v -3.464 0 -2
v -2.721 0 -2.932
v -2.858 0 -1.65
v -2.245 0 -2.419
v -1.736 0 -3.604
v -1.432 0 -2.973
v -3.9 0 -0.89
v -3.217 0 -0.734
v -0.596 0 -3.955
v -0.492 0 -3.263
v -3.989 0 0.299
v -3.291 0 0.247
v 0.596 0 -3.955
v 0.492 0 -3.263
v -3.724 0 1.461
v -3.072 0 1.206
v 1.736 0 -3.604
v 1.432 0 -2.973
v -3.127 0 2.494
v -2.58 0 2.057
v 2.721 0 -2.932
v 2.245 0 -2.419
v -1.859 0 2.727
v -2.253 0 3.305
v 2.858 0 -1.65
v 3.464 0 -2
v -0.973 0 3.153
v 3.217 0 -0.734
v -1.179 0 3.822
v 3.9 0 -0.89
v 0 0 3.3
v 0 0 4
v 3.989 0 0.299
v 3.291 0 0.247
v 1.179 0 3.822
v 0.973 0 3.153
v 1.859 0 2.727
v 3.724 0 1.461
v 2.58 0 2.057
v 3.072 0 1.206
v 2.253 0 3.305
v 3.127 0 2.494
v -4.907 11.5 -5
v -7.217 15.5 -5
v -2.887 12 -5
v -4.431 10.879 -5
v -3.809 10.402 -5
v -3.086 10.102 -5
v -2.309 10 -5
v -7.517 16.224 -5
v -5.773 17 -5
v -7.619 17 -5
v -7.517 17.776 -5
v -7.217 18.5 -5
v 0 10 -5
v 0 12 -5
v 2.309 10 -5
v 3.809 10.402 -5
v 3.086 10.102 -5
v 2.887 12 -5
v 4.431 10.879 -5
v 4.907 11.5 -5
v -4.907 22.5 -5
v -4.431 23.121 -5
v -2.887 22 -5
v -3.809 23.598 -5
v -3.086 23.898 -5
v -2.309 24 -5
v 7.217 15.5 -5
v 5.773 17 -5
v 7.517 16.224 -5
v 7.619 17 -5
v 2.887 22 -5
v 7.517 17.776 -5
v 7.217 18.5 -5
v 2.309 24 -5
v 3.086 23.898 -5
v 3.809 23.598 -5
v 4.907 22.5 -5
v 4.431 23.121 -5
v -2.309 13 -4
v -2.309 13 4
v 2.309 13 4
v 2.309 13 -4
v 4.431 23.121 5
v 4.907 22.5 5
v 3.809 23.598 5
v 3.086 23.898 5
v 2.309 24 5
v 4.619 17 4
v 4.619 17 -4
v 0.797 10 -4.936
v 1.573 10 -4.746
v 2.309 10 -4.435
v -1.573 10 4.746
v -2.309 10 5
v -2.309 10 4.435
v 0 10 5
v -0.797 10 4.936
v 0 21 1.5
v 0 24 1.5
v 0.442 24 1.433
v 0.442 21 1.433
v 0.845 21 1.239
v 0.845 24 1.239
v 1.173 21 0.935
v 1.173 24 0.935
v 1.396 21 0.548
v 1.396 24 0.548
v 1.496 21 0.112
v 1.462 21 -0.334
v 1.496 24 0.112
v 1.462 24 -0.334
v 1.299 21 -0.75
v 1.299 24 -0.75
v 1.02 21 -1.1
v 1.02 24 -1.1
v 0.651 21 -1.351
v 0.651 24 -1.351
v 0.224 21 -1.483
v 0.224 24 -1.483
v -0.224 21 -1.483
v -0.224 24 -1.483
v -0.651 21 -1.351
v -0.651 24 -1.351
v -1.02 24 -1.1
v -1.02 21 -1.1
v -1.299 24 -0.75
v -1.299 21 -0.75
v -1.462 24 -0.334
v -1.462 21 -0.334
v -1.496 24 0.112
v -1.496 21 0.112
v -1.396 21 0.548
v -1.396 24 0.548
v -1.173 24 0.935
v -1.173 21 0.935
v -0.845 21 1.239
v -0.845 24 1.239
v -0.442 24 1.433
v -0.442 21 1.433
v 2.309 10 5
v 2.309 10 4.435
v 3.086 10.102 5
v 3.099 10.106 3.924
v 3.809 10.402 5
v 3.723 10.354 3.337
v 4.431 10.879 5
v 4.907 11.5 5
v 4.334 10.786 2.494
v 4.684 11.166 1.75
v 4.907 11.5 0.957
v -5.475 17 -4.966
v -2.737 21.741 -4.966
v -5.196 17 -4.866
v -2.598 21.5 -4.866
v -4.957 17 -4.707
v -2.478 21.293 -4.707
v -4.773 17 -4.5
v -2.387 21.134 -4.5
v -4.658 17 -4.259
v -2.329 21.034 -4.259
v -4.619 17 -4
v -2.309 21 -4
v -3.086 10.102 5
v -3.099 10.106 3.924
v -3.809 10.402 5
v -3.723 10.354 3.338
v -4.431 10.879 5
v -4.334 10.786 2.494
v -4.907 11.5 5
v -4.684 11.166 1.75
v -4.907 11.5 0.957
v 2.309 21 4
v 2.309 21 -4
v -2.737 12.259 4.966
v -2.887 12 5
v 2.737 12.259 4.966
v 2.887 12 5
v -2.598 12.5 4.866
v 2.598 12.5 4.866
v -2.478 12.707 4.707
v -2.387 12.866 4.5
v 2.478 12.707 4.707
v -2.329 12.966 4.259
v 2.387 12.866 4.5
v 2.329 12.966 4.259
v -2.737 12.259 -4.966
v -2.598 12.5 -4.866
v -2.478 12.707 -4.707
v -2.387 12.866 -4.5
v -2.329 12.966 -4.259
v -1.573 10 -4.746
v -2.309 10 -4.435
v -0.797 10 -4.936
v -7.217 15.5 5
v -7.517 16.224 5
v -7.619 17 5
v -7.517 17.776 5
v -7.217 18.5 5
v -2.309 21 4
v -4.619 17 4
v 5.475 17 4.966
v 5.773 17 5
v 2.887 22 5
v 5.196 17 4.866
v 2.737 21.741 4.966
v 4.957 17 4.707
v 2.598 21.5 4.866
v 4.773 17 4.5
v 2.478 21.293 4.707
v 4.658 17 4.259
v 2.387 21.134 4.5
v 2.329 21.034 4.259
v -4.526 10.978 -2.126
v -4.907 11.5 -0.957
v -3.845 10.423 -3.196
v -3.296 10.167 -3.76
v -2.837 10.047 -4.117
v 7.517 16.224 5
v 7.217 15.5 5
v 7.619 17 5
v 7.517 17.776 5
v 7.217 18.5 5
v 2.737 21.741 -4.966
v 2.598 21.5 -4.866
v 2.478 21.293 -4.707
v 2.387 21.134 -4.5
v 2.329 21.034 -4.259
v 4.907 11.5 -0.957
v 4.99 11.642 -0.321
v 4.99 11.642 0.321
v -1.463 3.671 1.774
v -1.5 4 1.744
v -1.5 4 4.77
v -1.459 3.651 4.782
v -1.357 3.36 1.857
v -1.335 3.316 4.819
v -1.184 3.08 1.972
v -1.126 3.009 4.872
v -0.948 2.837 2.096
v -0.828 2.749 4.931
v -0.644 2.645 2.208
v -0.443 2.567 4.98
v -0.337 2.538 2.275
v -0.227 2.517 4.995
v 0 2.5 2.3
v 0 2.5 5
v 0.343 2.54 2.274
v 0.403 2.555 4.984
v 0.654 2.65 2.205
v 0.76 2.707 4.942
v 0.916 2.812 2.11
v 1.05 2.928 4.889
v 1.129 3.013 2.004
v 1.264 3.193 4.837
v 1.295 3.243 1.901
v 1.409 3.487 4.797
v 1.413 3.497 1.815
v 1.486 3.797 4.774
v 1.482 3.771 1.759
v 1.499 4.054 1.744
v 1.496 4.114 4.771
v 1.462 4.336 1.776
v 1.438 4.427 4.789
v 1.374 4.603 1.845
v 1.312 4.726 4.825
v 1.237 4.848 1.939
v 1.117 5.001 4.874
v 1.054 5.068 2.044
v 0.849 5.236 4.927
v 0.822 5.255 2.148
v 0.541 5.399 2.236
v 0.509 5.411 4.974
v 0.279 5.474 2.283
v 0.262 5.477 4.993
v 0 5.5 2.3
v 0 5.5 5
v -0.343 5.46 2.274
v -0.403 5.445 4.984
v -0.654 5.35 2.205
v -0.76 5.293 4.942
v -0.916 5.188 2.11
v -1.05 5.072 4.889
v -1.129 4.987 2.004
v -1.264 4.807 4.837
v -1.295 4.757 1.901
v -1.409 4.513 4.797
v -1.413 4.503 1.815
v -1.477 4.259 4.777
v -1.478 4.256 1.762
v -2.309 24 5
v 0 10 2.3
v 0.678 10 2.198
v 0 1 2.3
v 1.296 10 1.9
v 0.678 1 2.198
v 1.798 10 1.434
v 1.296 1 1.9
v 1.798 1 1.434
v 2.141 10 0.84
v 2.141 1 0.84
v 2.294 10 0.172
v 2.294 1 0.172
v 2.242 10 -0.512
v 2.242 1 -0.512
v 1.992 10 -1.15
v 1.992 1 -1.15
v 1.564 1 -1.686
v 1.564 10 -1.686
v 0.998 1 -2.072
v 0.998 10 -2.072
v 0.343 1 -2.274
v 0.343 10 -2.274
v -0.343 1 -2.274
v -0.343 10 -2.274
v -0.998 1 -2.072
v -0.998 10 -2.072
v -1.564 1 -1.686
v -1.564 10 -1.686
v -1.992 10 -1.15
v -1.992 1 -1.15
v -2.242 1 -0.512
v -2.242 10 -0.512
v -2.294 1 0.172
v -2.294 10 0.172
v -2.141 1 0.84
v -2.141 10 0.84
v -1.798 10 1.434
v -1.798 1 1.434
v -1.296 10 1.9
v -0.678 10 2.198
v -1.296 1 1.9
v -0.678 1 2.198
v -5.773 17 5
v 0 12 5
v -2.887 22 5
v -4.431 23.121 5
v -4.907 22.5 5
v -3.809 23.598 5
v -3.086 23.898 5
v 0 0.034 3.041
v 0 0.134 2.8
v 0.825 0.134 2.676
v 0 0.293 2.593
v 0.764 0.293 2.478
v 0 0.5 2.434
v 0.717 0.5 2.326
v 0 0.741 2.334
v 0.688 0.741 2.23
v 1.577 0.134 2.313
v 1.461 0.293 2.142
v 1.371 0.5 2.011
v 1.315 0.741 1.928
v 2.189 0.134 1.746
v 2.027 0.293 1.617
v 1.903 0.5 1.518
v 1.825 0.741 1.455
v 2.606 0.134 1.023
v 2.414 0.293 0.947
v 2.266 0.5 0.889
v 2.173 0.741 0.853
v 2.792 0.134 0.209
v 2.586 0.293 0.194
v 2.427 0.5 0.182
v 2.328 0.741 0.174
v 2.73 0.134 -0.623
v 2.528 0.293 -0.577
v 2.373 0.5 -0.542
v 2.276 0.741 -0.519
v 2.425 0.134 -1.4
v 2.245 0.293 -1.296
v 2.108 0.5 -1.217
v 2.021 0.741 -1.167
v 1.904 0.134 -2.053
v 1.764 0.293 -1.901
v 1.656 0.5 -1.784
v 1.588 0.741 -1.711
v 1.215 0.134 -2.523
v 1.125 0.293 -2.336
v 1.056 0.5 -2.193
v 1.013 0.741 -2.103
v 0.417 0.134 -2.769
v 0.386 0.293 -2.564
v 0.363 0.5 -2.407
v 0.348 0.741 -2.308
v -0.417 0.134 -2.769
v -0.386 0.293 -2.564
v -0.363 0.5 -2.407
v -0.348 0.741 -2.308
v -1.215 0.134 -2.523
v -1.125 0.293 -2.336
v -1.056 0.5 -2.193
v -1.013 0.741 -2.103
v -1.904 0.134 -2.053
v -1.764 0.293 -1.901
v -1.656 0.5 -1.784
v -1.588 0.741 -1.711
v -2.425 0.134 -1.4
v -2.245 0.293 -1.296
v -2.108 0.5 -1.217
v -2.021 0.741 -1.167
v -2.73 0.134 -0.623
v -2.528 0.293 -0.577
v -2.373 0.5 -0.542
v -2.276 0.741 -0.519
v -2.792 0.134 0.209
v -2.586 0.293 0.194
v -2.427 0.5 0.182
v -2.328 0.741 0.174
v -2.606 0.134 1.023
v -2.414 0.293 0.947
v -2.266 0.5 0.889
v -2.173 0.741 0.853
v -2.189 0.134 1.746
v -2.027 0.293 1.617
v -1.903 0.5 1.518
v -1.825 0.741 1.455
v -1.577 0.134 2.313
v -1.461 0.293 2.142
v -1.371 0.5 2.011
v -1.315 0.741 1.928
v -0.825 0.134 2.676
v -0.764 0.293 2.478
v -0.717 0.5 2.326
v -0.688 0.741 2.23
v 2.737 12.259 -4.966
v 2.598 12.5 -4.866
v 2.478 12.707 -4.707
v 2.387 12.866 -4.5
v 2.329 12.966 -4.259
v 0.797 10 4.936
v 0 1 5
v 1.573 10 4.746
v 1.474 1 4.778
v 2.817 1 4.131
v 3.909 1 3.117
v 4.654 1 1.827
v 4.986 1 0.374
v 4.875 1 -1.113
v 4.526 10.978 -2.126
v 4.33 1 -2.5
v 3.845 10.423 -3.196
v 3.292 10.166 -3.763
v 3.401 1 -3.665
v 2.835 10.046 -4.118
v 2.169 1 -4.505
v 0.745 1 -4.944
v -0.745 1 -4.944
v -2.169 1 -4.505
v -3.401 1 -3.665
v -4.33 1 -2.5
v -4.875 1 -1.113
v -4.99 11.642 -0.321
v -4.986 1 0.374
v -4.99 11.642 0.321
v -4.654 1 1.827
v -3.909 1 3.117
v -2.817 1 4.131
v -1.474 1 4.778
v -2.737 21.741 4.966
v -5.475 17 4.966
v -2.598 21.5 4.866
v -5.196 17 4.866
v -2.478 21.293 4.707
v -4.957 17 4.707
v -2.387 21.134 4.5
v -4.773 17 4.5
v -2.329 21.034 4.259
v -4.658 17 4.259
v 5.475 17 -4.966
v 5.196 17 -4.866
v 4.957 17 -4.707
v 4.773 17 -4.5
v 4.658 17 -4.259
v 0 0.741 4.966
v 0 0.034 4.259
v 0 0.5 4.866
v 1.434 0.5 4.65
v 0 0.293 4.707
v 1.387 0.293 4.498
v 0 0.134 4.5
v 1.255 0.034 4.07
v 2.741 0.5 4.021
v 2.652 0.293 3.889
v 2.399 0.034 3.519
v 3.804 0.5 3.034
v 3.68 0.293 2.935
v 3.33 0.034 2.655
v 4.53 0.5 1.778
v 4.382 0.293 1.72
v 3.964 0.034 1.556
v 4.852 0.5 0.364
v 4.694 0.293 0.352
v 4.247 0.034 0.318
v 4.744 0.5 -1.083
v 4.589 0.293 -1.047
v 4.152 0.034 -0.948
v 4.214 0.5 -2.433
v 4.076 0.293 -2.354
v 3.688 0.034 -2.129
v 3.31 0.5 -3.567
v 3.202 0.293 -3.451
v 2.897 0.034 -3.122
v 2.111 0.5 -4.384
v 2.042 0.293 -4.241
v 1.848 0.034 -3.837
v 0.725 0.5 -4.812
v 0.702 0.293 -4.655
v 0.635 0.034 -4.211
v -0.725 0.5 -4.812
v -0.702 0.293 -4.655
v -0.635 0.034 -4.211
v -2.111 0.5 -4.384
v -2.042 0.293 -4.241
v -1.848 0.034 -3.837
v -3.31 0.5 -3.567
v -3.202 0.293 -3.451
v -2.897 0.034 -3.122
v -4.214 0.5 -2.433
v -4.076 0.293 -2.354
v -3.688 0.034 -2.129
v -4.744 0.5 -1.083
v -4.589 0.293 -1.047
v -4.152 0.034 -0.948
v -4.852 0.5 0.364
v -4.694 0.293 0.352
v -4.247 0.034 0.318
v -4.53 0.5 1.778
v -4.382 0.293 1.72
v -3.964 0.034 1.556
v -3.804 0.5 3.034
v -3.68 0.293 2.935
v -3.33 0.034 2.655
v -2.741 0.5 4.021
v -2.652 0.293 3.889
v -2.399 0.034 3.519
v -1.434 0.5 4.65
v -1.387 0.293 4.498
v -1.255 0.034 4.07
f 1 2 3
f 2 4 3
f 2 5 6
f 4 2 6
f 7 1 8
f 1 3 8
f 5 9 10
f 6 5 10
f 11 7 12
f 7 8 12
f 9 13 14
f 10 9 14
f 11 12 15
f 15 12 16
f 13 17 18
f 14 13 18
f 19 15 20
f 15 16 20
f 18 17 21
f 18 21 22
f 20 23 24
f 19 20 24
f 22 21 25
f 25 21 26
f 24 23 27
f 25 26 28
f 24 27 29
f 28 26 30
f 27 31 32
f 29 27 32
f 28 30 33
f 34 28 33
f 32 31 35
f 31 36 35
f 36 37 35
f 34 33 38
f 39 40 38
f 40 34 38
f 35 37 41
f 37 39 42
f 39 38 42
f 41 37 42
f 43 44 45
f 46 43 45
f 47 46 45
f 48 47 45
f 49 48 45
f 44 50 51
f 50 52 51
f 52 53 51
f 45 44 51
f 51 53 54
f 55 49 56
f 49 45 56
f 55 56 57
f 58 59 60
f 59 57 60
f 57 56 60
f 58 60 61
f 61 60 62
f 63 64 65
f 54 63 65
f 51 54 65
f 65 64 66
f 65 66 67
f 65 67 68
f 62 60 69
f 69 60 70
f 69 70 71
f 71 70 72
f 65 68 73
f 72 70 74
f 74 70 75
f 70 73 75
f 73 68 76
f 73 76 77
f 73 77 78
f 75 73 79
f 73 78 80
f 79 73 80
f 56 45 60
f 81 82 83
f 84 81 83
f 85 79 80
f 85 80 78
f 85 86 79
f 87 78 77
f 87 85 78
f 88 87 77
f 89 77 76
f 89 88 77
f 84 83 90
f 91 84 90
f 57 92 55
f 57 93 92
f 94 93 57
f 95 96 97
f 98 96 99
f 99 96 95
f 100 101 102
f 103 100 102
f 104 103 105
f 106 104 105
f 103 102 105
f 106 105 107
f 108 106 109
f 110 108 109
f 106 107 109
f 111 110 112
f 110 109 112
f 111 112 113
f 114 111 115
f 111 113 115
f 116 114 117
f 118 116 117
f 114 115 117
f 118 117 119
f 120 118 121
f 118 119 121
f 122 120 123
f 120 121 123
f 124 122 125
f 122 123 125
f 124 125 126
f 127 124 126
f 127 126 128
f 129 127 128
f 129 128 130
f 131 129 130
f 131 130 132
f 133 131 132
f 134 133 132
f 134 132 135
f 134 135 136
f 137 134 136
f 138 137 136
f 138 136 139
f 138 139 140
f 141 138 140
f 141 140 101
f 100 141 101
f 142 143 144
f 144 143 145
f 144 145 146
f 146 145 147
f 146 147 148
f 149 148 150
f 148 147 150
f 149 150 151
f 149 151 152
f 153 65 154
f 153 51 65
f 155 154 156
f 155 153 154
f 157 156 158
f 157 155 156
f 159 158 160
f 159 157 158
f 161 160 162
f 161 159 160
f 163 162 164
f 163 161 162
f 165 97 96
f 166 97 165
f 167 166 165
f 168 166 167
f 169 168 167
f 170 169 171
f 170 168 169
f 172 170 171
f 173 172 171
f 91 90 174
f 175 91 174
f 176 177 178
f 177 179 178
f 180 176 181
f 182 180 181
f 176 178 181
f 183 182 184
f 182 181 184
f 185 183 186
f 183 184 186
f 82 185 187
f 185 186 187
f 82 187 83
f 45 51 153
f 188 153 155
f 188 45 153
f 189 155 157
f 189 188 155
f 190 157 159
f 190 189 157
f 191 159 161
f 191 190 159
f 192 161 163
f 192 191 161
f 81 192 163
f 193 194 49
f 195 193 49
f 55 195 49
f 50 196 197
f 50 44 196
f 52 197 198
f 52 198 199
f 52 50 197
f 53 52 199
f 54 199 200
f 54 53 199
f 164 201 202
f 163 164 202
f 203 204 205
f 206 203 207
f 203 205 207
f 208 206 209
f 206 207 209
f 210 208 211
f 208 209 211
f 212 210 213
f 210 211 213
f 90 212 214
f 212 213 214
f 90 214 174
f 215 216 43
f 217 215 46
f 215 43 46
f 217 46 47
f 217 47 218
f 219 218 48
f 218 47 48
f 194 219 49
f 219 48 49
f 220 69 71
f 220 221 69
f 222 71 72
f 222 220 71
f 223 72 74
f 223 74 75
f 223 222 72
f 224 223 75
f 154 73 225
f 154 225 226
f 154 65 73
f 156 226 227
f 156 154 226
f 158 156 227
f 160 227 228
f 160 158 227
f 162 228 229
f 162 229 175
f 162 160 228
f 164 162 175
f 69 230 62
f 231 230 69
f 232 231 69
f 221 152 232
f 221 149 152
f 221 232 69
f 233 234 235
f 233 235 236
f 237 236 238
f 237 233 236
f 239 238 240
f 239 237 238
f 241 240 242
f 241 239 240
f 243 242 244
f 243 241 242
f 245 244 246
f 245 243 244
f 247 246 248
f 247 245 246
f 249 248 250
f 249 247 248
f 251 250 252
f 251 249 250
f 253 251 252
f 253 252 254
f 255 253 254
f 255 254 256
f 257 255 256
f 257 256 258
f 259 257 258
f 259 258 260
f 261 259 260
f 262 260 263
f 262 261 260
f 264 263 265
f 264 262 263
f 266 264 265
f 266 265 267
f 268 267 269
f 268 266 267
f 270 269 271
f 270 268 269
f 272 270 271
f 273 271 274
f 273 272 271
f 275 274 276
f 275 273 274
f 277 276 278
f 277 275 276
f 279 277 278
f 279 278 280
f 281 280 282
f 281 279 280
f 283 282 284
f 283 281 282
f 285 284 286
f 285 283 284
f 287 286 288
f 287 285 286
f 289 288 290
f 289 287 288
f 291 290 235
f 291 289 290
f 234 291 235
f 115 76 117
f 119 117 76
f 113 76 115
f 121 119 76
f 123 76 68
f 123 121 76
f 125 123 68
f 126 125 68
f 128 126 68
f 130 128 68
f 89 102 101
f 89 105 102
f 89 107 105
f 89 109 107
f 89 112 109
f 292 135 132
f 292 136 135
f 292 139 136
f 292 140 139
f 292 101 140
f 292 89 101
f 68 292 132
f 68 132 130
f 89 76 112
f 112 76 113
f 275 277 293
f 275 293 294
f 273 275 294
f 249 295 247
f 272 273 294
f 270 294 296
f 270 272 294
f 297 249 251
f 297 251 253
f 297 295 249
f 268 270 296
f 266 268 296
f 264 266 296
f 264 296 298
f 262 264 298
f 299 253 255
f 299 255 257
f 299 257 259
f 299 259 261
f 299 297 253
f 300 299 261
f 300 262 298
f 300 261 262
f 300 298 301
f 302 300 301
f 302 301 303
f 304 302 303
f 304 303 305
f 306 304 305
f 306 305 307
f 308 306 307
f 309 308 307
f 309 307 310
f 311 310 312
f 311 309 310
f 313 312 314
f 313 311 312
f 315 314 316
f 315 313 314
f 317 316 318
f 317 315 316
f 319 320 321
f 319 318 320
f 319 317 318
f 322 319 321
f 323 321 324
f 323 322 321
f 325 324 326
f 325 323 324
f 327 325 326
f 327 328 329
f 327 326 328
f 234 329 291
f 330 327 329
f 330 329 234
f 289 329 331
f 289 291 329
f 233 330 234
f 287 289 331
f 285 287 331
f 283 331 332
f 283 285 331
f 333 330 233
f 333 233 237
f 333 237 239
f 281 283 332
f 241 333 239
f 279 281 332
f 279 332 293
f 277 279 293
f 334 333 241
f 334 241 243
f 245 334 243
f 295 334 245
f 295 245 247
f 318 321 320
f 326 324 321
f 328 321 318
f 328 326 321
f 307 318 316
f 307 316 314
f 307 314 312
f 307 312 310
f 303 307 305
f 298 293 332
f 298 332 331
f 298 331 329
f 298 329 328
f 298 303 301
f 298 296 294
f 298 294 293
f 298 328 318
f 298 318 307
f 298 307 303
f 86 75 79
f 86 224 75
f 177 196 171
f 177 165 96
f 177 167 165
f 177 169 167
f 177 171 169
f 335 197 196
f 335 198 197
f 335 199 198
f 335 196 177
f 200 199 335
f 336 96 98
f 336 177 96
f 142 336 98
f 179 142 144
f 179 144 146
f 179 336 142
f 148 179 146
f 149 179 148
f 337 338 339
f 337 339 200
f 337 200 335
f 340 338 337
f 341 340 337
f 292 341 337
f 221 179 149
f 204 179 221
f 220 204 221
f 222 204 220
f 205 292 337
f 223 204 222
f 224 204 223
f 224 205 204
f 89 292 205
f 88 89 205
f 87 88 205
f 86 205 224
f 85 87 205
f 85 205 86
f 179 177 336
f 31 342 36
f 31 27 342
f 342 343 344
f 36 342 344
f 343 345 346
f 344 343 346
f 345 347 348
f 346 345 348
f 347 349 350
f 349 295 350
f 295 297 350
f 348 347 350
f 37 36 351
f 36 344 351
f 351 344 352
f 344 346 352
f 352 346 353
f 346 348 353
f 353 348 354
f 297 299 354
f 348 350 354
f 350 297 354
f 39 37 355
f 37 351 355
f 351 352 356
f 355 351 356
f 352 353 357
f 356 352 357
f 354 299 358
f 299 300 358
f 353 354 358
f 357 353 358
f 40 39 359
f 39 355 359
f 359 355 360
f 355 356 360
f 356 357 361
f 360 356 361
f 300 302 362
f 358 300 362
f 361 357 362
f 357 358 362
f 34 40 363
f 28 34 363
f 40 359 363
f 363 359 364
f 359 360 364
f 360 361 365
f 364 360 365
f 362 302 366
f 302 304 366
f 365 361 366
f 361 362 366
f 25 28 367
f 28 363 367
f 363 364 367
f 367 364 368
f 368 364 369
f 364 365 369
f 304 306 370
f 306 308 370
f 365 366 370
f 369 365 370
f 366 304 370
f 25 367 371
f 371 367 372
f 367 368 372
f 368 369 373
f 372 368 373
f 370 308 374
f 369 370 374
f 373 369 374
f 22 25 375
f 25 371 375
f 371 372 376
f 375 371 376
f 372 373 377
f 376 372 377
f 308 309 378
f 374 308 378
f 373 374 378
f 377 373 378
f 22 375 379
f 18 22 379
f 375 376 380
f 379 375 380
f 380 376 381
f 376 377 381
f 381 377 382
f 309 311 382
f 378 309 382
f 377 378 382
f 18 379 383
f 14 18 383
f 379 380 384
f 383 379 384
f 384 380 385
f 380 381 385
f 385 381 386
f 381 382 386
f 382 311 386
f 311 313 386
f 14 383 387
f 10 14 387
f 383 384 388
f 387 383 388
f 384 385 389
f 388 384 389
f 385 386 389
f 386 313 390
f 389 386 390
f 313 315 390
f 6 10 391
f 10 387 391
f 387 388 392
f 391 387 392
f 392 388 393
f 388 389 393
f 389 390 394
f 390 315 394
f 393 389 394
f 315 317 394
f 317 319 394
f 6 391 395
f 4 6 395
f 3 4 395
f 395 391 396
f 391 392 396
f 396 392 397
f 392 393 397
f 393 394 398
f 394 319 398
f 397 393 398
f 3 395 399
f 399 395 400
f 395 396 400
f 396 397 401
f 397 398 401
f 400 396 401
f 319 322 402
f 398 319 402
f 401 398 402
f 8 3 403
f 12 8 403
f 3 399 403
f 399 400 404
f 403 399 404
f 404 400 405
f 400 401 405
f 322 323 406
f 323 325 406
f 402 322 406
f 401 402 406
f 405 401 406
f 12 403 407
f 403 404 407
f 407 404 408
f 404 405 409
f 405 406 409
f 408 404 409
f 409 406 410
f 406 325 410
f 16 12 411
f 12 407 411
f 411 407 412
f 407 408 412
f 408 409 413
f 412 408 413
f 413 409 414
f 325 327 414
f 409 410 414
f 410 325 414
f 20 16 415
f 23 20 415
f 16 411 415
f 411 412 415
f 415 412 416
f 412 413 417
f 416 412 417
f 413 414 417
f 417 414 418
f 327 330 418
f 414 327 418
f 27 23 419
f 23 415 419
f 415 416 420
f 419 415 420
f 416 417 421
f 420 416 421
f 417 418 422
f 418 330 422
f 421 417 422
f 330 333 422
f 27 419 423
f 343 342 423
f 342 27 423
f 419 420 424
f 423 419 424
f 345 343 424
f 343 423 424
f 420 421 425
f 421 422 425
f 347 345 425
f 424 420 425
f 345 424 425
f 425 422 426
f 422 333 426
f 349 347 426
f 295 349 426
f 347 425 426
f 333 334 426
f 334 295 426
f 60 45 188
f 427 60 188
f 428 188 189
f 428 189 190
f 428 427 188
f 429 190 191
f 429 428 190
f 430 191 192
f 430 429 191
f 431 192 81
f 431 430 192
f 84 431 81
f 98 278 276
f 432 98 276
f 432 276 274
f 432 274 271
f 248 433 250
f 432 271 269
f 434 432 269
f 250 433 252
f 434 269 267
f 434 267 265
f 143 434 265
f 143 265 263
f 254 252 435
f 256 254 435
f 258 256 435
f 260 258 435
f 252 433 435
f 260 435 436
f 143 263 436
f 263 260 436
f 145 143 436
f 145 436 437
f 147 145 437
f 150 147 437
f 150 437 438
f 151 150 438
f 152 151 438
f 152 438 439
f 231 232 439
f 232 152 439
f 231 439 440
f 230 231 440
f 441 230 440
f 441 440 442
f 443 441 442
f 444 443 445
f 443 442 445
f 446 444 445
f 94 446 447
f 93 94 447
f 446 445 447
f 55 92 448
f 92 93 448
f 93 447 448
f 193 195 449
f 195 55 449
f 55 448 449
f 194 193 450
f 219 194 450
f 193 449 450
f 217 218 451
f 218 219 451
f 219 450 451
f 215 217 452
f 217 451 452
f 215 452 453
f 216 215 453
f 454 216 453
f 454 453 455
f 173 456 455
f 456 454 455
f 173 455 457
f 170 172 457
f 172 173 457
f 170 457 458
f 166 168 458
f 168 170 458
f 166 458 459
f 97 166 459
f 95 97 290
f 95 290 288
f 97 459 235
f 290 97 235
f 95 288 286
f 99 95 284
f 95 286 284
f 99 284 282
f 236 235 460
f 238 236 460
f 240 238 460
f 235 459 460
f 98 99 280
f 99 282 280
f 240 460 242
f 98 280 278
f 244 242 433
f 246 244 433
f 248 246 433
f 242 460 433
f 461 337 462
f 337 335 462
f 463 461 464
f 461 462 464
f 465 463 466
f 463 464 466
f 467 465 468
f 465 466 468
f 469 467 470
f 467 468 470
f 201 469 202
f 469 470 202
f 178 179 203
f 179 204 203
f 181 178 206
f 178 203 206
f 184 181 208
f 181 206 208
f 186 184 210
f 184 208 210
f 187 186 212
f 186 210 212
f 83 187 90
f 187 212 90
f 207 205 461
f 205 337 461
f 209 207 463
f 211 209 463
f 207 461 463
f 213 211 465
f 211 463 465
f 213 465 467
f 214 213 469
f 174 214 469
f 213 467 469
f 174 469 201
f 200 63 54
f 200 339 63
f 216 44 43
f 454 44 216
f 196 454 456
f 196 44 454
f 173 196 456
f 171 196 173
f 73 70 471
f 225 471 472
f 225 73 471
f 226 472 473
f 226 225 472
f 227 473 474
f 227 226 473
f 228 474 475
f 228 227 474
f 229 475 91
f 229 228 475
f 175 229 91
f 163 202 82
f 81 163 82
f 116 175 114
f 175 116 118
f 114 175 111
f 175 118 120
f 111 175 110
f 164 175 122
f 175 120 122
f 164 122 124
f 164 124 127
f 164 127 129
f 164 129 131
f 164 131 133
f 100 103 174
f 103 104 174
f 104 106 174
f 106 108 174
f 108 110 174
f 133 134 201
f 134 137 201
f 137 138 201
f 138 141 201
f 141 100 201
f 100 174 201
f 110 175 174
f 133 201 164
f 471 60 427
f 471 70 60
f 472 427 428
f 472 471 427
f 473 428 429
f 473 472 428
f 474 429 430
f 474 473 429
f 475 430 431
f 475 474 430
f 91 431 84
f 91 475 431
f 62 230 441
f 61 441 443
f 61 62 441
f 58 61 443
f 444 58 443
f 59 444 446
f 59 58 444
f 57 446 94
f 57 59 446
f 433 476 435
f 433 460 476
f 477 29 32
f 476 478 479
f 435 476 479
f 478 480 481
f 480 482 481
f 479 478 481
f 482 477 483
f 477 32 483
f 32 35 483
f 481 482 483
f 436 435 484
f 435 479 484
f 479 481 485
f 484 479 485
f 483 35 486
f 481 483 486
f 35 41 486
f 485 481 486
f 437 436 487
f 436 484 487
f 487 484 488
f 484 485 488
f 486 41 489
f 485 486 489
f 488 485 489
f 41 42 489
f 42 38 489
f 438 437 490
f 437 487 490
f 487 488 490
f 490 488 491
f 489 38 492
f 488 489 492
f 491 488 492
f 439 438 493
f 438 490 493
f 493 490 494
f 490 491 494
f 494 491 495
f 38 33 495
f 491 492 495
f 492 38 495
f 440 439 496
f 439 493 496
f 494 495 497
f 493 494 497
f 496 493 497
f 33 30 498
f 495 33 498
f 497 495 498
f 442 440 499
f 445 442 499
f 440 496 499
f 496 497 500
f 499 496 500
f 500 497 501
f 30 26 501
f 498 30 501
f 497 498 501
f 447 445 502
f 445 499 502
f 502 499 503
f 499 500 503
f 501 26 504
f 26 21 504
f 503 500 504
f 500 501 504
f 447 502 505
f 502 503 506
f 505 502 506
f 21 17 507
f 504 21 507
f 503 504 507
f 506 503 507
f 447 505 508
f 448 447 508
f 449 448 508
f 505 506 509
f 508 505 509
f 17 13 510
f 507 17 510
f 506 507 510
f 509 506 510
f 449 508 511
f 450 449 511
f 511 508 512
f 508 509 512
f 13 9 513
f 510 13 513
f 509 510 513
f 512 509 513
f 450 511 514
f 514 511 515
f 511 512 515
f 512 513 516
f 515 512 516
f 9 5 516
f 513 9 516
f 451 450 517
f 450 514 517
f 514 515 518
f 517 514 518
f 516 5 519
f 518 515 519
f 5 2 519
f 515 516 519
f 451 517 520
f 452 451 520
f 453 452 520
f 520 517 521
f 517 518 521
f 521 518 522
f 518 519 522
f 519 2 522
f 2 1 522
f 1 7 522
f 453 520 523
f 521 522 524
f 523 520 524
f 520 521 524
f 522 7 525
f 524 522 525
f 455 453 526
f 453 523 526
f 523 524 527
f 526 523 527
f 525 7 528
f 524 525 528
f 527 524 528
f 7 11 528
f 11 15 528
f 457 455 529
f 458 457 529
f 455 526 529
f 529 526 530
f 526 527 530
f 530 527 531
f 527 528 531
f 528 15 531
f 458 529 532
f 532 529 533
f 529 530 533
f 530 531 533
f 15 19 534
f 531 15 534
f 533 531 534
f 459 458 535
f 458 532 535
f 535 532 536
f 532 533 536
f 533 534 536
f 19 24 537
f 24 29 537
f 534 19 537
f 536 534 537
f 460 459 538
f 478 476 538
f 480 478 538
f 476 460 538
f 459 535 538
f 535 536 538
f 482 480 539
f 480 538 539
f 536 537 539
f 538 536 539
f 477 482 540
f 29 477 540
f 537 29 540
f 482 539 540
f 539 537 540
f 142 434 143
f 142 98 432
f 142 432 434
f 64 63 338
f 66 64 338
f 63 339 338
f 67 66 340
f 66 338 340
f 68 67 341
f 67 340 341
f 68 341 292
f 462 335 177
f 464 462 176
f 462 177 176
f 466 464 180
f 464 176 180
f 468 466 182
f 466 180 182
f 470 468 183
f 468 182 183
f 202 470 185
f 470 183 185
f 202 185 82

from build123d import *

# Parameters (mm, degrees)
ESBO_O1_R                = 5
ESBO_O1_R_2              = 2.3
RESSALTO_EXTRUS_O1_DEPTH = 12
ESBO_O2_R                = 1.5
CORTE_EXTRUS_O1_DEPTH    = 10
RESSALTO_EXTRUS_O2_DEPTH = 5
ESBO_O4_R                = 1.5
CORTE_EXTRUS_O2_DEPTH    = 5
FILETE1_R                = 1
FILETE2_R                = 3


with BuildPart() as part:
    # Esboço1 → Ressalto-extrusão1 (new body)
    with BuildSketch(Plane(origin=(0, 0, 0), x_dir=(1, 0, 0), z_dir=(0, 1, 0))):
        with Locations(Location((0, 0, 0), (0, 0, 270))):
            Circle(ESBO_O1_R)
        with Locations(Location((0, 0, 0), (0, 0, 270))):
            Circle(ESBO_O1_R_2, mode=Mode.SUBTRACT)
    extrude(amount=RESSALTO_EXTRUS_O1_DEPTH)

    # Esboço2 → Corte-extrusão1 (cut)
    with BuildSketch(Plane.XY):
        with Locations(Location((0, 4, 0), (0, 0, 180))):
            Circle(ESBO_O2_R)
    extrude(amount=CORTE_EXTRUS_O1_DEPTH, mode=Mode.SUBTRACT)

    # Esboço3 → Ressalto-extrusão2 (add, symmetric)
    with BuildSketch(Plane.XY):
        Polygon((4.041451884, 10), (8.082903769, 17), (4.041451884, 24), (-4.041451884, 24), (-8.082903769, 17), (-4.041451884, 10), align=None)
        Polygon((2.309401077, 13), (4.618802154, 17), (2.309401077, 21), (-2.309401077, 21), (-4.618802154, 17), (-2.309401077, 13), align=None, mode=Mode.SUBTRACT)
    extrude(amount=RESSALTO_EXTRUS_O2_DEPTH, both=True)

    # Esboço4 → Corte-extrusão2 (cut)
    with BuildSketch(Plane(origin=(0, 24, 0), x_dir=(1, 0, 0), z_dir=(0, 1, 0))):
        with Locations(Location((0, 0, 0), (0, 0, 270))):
            Circle(ESBO_O4_R)
    extrude(amount=-CORTE_EXTRUS_O2_DEPTH, mode=Mode.SUBTRACT)

    # Filete1
    filete1_edges = [part.edges().sort_by_distance(p)[0] for p in [
        (0, 0, -5),
        (0, 13, -5),
        (3.464101615, 15, -5),
        (3.464101615, 19, -5),
        (0, 21, -5),
        (-3.464101615, 19, -5),
        (-3.464101615, 15, -5),
        (0, 13, 5),
        (3.464101615, 15, 5),
        (3.464101615, 19, 5),
        (0, 21, 5),
        (-3.464101615, 19, 5),
        (-3.464101615, 15, 5),
        (0, 0, -2.3),
    ]]
    fillet(filete1_edges, radius=FILETE1_R - 0.0001)  # a hair under: the kernel refuses the full size

    # Filete2
    filete2_edges = [part.edges().sort_by_distance(p)[0] for p in [
        (-4.041451884, 10, -3.971960144),
        (-4.041451884, 10, 3.971960144),
        (8.082903769, 17, 0),
        (4.041451884, 10, 3.971960144),
        (4.041451884, 10, -3.971960144),
        (4.041451884, 24, 0),
        (-4.041451884, 24, 0),
        (-8.082903769, 17, 0),
    ]]
    fillet(filete2_edges, radius=FILETE2_R)


solid = part.part
